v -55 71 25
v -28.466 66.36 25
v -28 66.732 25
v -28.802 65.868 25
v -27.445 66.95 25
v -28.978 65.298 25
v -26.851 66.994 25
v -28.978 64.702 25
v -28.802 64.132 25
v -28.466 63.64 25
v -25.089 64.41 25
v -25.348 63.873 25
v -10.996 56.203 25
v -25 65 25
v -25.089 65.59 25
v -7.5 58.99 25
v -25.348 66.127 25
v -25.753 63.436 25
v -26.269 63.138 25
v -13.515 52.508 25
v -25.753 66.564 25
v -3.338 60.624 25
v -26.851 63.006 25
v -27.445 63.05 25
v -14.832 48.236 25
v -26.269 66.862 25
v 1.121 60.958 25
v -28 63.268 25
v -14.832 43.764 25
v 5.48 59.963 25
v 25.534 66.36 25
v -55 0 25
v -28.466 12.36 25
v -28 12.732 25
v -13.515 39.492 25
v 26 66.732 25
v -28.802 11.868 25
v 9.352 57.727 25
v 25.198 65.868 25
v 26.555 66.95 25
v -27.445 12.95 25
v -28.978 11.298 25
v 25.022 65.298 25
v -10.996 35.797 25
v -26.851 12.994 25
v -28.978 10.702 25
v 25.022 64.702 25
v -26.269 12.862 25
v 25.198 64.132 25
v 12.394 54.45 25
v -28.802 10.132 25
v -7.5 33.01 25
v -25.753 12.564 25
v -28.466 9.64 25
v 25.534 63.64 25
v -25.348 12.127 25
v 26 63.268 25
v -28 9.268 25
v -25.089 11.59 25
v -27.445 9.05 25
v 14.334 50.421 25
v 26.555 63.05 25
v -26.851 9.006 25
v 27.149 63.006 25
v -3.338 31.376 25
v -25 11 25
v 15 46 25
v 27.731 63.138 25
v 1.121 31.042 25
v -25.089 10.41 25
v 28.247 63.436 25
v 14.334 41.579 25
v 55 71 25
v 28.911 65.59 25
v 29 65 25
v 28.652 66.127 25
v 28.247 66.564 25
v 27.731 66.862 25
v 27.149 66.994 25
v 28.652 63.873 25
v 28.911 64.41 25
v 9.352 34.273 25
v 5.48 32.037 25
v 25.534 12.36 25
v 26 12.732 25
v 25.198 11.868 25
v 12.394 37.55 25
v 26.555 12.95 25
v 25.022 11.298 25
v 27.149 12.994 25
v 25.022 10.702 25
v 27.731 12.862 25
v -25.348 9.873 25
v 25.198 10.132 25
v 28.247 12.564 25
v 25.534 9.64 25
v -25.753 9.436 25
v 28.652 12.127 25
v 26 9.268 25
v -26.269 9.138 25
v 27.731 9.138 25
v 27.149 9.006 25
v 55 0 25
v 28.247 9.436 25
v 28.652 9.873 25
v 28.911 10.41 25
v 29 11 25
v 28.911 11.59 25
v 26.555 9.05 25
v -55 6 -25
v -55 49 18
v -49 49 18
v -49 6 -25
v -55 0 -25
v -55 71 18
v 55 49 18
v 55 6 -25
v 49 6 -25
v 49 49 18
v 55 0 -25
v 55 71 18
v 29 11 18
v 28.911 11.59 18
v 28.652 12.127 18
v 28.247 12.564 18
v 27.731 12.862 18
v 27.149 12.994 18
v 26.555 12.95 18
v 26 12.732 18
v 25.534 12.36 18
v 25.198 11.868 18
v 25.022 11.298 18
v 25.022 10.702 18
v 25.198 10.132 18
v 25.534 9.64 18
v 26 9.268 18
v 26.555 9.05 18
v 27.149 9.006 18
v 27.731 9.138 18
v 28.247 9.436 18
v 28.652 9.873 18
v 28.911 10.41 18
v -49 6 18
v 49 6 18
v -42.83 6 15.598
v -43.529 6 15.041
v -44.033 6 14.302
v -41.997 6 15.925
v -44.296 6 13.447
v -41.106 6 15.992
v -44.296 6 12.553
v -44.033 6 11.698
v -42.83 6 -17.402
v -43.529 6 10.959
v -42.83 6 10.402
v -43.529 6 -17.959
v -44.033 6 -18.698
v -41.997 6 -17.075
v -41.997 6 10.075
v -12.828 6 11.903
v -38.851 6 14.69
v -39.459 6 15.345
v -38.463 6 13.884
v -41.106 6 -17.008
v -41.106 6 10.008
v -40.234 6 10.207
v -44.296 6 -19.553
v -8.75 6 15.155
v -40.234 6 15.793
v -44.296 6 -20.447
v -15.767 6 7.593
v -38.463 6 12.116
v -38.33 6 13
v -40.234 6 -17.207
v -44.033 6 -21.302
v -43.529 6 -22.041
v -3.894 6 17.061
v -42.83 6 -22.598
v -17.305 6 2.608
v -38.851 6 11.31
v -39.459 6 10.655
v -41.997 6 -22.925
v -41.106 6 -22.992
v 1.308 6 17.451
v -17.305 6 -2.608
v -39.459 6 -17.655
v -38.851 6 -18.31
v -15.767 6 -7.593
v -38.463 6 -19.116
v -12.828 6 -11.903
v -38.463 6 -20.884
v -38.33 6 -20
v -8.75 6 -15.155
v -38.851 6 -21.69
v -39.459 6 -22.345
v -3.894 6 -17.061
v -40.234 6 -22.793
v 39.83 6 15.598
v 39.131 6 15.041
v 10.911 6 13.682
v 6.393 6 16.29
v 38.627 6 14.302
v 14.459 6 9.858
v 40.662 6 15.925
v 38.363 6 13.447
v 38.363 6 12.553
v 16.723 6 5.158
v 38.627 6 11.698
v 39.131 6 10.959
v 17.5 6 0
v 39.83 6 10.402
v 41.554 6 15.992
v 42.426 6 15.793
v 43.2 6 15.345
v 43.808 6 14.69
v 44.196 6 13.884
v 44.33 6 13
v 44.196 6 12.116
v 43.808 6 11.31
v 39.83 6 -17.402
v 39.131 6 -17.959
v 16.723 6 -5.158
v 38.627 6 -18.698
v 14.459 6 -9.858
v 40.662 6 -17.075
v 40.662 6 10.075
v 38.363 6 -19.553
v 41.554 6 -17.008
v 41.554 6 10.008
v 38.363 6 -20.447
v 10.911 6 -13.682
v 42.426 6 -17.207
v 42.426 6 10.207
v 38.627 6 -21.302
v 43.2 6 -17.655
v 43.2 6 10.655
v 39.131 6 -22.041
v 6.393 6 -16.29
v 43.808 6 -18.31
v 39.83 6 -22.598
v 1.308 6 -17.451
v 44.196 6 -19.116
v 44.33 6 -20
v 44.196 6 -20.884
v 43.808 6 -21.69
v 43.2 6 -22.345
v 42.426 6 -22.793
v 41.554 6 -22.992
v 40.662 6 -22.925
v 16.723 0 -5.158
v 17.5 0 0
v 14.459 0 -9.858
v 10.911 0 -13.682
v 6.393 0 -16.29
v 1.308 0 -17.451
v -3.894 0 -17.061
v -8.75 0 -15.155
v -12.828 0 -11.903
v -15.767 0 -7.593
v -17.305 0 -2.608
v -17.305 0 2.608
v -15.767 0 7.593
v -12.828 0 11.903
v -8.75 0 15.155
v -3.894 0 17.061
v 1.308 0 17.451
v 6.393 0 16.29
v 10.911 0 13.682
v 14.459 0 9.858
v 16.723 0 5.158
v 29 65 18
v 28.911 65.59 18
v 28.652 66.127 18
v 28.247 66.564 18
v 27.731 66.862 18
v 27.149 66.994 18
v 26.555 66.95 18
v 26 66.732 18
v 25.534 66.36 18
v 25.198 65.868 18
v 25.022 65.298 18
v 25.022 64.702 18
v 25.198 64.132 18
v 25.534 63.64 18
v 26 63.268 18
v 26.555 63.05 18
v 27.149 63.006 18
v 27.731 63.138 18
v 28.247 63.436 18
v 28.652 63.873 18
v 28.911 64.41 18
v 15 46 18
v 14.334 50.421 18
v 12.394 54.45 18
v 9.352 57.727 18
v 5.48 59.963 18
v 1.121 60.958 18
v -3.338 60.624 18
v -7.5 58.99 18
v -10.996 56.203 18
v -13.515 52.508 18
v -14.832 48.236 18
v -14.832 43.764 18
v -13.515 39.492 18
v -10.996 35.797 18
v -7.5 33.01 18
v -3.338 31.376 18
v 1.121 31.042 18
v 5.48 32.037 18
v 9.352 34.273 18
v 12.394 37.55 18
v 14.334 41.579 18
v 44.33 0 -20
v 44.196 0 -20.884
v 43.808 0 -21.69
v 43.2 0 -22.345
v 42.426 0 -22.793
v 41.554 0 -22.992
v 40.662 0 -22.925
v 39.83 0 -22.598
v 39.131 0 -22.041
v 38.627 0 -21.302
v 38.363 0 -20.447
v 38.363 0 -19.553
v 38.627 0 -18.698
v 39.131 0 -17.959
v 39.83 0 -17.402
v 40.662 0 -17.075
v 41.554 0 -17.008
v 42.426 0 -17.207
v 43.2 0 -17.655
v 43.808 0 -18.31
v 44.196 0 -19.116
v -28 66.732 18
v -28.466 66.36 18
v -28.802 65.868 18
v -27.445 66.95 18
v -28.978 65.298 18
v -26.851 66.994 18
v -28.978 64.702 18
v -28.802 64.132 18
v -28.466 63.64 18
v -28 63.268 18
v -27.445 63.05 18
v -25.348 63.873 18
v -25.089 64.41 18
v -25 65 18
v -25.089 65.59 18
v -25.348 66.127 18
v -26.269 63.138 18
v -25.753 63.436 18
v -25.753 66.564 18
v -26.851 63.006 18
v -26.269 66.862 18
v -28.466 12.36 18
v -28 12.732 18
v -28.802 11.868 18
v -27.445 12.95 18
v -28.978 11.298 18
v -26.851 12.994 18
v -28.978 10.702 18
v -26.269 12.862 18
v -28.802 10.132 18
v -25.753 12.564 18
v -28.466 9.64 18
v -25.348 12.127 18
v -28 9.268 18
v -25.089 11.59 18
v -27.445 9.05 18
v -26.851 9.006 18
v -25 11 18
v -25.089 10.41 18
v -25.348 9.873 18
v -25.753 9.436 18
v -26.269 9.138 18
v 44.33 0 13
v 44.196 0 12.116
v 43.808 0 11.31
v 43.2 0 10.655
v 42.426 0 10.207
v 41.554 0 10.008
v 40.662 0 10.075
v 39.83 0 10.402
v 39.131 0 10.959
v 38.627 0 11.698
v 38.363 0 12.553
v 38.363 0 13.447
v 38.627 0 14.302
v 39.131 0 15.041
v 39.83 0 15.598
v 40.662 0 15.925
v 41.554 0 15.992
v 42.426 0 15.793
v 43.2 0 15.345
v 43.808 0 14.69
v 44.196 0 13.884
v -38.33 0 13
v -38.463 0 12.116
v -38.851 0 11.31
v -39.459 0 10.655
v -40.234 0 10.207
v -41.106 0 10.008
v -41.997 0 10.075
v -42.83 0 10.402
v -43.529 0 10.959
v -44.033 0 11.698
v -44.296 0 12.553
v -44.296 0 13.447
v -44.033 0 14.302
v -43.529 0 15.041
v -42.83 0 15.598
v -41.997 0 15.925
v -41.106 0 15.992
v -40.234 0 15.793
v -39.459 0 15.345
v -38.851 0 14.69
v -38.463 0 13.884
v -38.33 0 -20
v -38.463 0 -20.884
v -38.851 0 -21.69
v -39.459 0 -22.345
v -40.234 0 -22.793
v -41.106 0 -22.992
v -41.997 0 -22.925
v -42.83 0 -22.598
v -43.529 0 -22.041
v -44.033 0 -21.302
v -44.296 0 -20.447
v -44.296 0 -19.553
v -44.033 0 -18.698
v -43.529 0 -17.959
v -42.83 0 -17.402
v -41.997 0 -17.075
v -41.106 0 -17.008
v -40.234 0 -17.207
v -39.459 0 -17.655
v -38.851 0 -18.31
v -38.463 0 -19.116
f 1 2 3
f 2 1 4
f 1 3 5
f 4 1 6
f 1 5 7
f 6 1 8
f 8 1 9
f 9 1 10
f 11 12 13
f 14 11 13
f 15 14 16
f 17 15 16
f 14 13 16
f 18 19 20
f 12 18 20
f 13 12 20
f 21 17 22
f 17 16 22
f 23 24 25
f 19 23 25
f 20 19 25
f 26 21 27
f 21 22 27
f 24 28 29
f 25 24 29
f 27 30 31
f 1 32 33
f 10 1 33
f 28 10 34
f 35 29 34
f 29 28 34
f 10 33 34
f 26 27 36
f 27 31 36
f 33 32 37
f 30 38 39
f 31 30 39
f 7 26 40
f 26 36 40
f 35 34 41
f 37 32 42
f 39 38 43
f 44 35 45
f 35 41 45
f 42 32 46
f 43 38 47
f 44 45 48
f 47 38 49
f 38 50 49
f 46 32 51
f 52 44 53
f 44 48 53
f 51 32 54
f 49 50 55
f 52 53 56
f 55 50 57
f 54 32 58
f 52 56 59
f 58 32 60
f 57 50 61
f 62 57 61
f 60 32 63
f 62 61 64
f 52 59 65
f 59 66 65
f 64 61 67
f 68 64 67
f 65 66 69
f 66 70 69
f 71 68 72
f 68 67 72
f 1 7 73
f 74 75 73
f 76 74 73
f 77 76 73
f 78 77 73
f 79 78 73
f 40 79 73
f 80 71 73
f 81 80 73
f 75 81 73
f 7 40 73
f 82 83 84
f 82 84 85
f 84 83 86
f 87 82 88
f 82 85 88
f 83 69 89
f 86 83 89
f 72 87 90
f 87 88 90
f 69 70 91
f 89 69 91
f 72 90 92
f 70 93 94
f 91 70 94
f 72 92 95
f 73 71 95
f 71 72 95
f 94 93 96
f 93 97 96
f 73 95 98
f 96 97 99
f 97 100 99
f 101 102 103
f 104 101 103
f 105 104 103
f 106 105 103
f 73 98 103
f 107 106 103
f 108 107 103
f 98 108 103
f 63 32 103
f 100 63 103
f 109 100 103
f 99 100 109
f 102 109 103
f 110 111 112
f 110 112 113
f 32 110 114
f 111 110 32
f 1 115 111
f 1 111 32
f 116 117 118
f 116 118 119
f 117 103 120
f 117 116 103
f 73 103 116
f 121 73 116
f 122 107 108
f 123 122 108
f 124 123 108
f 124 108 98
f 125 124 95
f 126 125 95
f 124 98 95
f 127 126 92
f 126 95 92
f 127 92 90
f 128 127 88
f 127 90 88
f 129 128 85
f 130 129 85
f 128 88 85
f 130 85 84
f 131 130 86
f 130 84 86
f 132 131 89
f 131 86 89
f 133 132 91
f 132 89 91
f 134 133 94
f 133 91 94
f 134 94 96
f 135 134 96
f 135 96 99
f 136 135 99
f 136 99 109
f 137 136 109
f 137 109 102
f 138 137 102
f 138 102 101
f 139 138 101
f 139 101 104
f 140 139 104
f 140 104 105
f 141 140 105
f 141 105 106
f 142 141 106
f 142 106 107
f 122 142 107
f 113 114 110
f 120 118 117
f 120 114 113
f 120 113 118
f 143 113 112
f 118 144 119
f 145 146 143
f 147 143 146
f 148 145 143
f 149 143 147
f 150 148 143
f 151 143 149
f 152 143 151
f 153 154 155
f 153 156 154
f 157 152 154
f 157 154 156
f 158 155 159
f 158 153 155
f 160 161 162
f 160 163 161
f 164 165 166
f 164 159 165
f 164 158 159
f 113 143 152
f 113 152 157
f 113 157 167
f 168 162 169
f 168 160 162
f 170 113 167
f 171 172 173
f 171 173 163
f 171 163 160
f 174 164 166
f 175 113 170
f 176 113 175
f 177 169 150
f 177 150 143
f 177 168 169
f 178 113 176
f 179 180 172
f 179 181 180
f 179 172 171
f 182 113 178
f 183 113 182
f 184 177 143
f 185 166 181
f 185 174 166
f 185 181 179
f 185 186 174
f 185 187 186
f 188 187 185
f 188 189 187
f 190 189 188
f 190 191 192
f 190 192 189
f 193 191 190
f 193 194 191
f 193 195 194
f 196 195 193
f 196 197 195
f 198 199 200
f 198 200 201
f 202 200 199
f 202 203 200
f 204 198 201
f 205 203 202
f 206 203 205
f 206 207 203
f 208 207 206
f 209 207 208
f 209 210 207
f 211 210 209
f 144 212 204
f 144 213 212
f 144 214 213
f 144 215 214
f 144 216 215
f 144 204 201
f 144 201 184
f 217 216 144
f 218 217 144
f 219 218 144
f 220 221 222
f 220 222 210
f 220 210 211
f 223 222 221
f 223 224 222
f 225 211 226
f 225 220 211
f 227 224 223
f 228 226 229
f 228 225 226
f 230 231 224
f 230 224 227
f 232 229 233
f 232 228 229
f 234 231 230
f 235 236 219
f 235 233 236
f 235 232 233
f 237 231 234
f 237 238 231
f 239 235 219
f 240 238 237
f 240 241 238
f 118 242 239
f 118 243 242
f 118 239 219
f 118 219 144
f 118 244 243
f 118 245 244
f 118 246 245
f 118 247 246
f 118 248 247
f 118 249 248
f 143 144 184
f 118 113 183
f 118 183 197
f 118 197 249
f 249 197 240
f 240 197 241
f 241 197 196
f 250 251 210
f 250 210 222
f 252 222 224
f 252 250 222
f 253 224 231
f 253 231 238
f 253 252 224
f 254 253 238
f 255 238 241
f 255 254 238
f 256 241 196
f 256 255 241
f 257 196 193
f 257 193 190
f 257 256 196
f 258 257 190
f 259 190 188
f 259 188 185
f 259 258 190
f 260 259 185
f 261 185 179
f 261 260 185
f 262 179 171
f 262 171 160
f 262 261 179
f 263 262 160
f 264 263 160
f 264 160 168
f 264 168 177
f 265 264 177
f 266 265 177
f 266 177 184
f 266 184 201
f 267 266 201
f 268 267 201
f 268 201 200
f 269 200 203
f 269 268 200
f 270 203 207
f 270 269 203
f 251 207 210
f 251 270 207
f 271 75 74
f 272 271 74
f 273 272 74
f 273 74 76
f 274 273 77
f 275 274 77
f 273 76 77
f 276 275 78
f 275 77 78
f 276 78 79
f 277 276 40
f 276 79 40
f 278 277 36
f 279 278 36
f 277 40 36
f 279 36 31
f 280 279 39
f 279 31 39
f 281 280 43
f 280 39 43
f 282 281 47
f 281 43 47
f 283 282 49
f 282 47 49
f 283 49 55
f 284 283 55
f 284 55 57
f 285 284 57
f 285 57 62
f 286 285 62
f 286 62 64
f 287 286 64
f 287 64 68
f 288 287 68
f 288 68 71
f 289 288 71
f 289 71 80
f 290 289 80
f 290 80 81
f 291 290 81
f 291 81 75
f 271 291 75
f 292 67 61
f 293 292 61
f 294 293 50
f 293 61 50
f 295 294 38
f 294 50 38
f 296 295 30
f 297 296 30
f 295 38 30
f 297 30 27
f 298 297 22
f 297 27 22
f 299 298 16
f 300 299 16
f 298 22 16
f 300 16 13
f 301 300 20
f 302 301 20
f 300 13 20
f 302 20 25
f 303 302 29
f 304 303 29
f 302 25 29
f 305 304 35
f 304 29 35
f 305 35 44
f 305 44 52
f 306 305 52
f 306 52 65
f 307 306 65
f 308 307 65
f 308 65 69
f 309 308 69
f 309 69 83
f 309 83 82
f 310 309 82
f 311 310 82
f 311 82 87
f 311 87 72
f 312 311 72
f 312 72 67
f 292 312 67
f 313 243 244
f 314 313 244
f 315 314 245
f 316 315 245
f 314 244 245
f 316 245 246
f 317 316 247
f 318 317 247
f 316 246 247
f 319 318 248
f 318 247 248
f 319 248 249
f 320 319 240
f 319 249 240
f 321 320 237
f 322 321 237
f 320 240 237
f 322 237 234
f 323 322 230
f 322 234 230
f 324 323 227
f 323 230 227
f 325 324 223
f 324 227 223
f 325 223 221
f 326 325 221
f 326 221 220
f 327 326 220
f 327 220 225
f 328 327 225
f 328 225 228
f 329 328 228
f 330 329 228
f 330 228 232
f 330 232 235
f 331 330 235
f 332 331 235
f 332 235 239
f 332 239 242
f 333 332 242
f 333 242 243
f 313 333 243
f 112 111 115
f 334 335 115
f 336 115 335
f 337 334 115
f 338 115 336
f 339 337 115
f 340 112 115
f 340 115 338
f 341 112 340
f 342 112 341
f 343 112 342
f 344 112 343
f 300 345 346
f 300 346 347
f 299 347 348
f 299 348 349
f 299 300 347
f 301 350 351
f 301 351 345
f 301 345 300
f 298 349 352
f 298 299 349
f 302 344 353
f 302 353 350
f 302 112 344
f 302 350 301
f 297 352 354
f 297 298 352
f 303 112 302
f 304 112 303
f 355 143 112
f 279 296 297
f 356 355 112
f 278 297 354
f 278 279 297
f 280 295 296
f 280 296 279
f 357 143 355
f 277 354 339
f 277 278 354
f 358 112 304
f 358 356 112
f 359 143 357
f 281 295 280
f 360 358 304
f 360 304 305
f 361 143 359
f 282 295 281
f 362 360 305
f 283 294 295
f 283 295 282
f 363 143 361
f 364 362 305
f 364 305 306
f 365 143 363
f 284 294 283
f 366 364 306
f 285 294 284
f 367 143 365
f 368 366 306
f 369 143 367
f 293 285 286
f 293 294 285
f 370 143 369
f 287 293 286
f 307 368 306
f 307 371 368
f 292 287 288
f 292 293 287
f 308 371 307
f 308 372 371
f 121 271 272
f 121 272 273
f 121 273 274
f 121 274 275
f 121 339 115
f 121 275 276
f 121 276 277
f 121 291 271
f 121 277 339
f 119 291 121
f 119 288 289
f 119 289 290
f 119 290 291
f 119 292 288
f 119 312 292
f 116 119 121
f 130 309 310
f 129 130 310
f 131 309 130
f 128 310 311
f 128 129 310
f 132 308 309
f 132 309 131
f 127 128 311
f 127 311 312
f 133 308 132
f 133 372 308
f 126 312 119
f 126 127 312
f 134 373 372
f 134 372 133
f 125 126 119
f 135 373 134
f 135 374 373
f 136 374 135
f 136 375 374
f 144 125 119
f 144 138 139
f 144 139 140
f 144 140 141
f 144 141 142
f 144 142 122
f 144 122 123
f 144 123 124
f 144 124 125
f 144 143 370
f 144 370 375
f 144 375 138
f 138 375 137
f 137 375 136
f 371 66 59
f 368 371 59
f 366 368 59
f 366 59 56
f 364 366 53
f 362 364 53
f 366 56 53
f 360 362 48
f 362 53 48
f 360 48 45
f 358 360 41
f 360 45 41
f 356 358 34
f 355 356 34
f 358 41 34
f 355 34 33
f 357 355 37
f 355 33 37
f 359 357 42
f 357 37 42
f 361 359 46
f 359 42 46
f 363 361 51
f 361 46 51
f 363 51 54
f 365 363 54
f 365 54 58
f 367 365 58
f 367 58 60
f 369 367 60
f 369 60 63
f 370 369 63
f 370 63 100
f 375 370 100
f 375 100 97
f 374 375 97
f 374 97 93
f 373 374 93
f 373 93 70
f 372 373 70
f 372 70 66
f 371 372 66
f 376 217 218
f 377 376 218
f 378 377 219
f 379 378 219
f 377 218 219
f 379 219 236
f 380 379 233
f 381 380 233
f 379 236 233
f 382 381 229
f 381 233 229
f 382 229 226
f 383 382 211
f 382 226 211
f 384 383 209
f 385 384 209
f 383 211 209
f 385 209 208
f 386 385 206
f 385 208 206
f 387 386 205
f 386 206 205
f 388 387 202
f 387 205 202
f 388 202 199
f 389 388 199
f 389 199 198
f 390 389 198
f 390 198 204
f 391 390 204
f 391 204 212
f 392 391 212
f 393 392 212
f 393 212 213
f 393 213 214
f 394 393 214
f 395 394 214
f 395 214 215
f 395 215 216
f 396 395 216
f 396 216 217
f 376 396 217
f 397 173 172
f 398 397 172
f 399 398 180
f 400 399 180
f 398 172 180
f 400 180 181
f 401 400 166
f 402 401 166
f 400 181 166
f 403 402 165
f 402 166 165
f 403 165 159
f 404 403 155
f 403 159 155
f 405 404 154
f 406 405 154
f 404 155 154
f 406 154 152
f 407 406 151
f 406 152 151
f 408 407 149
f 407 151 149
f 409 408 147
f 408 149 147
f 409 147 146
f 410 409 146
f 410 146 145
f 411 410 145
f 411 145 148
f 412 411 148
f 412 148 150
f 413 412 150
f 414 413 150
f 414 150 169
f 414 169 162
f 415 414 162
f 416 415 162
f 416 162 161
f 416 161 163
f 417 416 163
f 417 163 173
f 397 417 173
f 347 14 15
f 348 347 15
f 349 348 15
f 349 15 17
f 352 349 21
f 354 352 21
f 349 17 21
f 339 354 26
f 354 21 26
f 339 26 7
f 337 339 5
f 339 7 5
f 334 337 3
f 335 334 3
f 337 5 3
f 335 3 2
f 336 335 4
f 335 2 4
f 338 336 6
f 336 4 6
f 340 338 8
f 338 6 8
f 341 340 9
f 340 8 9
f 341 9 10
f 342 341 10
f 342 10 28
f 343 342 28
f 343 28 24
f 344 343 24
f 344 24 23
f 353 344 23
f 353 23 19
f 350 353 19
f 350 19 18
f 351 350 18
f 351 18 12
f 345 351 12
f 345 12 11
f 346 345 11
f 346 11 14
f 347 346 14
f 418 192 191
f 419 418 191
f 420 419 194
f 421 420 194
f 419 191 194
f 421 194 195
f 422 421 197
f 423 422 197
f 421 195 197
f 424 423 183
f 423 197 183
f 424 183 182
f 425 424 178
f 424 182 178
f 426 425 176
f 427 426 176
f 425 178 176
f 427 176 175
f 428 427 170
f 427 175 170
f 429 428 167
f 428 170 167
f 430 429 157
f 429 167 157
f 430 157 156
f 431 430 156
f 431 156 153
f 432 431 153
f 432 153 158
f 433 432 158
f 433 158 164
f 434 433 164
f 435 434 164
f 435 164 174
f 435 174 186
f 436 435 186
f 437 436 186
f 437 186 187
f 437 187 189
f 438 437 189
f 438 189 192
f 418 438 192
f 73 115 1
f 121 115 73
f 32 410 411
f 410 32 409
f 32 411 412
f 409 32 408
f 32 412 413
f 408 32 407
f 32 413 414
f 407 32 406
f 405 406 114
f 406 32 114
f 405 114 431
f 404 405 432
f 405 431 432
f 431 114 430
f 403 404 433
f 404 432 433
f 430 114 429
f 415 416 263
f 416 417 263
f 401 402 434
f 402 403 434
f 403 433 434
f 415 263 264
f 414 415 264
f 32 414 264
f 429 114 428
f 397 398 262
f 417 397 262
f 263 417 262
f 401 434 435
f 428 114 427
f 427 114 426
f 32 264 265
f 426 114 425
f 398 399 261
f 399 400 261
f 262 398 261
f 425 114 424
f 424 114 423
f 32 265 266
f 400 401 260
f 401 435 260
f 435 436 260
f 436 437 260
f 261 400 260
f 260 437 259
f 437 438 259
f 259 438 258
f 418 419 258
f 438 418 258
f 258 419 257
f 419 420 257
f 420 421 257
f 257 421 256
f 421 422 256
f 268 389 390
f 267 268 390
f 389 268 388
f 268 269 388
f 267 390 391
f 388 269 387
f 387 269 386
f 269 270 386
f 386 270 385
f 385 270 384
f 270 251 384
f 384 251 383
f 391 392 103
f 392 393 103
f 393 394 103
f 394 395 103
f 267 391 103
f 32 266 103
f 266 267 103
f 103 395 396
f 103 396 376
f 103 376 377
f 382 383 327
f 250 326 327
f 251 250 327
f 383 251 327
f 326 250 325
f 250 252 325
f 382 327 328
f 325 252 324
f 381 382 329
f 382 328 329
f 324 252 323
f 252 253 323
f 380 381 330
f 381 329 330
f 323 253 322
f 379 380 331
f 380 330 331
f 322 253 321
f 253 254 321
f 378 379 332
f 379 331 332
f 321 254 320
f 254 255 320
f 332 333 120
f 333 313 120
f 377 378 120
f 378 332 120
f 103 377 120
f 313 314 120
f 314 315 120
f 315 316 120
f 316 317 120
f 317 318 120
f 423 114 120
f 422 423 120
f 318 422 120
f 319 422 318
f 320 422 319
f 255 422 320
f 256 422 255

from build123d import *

# Parameters (mm, degrees)
SKETCH1_W           = 110
SKETCH1_H           = 50
SKETCH1_R           = 17.5
BOSS_EXTRUDE1_DEPTH = 6
SKETCH2_W           = 110
SKETCH2_H           = 7
BOSS_EXTRUDE2_DEPTH = 65
BOSS_EXTRUDE3_DEPTH = 6
BOSS_EXTRUDE4_DEPTH = 6
CUT_EXTRUDE1_REACH  = 52
SKETCH5_R           = 15
SKETCH6_R           = 3
CUT_EXTRUDE2_DEPTH  = 7
SKETCH7_R           = 2
CUT_EXTRUDE3_DEPTH  = 51


with BuildPart() as part:
    # Sketch1 → Boss-Extrude1 (new body)
    with BuildSketch(Plane(origin=(0, 0, 0), x_dir=(1, 0, 0), z_dir=(0, 1, 0))):
        Rectangle(SKETCH1_W, SKETCH1_H)
        Circle(SKETCH1_R, mode=Mode.SUBTRACT)
    extrude(amount=BOSS_EXTRUDE1_DEPTH)

    # Sketch2 → Boss-Extrude2 (add)
    with BuildSketch(Plane(origin=(0, 6, 0), x_dir=(1, 0, 0), z_dir=(0, 1, 0))):
        with Locations((0, -21.5)):
            Rectangle(SKETCH2_W, SKETCH2_H)
    extrude(amount=BOSS_EXTRUDE2_DEPTH)

    # Sketch3 → Boss-Extrude3 (add)
    with BuildSketch(Plane(origin=(55, 0, 0), x_dir=(0, 0, -1), z_dir=(1, 0, 0))):
        Polygon((-18, 6), (25, 6), (-18, 49), align=None)
    extrude(amount=-BOSS_EXTRUDE3_DEPTH)

    # Sketch4 → Boss-Extrude4 (add)
    with BuildSketch(Plane.ZY.offset(55)):
        Polygon((-25, 6), (18, 6), (18, 49), align=None)
    extrude(amount=-BOSS_EXTRUDE4_DEPTH)

    # Sketch5 → Cut-Extrude1 (cut, up to next)
    with BuildSketch(Plane.XY.offset(25), mode=Mode.PRIVATE) as cut_extrude1_sk1:
        with Locations((0, 46)):
            Circle(SKETCH5_R)
    cut_extrude1_tool1 = extrude(cut_extrude1_sk1.sketch, amount=-CUT_EXTRUDE1_REACH, mode=Mode.PRIVATE) & part.part
    add(cut_extrude1_tool1.solids().sort_by_distance((0, 46, 25))[0], mode=Mode.SUBTRACT)

    # Sketch6 → Cut-Extrude2 (cut, through all)
    with BuildSketch(Plane(origin=(0, 6, 0), x_dir=(1, 0, 0), z_dir=(0, 1, 0))):
        with Locations((-41.329699244, 20)):
            Circle(SKETCH6_R)
        with Locations((-41.329699244, -13)):
            Circle(SKETCH6_R)
        with Locations((41.329699244, -13)):
            Circle(SKETCH6_R)
        with Locations((41.329699244, 20)):
            Circle(SKETCH6_R)
    extrude(amount=-CUT_EXTRUDE2_DEPTH, mode=Mode.SUBTRACT)

    # Sketch7 → Cut-Extrude3 (cut, through all)
    with BuildSketch(Plane.XY.offset(25)):
        with Locations((-27, 65)):
            Circle(SKETCH7_R)
        with Locations((27, 65)):
            Circle(SKETCH7_R)
        with Locations((-27, 11)):
            Circle(SKETCH7_R)
        with Locations((27, 11)):
            Circle(SKETCH7_R)
    extrude(amount=-CUT_EXTRUDE3_DEPTH, mode=Mode.SUBTRACT)


solid = part.part
